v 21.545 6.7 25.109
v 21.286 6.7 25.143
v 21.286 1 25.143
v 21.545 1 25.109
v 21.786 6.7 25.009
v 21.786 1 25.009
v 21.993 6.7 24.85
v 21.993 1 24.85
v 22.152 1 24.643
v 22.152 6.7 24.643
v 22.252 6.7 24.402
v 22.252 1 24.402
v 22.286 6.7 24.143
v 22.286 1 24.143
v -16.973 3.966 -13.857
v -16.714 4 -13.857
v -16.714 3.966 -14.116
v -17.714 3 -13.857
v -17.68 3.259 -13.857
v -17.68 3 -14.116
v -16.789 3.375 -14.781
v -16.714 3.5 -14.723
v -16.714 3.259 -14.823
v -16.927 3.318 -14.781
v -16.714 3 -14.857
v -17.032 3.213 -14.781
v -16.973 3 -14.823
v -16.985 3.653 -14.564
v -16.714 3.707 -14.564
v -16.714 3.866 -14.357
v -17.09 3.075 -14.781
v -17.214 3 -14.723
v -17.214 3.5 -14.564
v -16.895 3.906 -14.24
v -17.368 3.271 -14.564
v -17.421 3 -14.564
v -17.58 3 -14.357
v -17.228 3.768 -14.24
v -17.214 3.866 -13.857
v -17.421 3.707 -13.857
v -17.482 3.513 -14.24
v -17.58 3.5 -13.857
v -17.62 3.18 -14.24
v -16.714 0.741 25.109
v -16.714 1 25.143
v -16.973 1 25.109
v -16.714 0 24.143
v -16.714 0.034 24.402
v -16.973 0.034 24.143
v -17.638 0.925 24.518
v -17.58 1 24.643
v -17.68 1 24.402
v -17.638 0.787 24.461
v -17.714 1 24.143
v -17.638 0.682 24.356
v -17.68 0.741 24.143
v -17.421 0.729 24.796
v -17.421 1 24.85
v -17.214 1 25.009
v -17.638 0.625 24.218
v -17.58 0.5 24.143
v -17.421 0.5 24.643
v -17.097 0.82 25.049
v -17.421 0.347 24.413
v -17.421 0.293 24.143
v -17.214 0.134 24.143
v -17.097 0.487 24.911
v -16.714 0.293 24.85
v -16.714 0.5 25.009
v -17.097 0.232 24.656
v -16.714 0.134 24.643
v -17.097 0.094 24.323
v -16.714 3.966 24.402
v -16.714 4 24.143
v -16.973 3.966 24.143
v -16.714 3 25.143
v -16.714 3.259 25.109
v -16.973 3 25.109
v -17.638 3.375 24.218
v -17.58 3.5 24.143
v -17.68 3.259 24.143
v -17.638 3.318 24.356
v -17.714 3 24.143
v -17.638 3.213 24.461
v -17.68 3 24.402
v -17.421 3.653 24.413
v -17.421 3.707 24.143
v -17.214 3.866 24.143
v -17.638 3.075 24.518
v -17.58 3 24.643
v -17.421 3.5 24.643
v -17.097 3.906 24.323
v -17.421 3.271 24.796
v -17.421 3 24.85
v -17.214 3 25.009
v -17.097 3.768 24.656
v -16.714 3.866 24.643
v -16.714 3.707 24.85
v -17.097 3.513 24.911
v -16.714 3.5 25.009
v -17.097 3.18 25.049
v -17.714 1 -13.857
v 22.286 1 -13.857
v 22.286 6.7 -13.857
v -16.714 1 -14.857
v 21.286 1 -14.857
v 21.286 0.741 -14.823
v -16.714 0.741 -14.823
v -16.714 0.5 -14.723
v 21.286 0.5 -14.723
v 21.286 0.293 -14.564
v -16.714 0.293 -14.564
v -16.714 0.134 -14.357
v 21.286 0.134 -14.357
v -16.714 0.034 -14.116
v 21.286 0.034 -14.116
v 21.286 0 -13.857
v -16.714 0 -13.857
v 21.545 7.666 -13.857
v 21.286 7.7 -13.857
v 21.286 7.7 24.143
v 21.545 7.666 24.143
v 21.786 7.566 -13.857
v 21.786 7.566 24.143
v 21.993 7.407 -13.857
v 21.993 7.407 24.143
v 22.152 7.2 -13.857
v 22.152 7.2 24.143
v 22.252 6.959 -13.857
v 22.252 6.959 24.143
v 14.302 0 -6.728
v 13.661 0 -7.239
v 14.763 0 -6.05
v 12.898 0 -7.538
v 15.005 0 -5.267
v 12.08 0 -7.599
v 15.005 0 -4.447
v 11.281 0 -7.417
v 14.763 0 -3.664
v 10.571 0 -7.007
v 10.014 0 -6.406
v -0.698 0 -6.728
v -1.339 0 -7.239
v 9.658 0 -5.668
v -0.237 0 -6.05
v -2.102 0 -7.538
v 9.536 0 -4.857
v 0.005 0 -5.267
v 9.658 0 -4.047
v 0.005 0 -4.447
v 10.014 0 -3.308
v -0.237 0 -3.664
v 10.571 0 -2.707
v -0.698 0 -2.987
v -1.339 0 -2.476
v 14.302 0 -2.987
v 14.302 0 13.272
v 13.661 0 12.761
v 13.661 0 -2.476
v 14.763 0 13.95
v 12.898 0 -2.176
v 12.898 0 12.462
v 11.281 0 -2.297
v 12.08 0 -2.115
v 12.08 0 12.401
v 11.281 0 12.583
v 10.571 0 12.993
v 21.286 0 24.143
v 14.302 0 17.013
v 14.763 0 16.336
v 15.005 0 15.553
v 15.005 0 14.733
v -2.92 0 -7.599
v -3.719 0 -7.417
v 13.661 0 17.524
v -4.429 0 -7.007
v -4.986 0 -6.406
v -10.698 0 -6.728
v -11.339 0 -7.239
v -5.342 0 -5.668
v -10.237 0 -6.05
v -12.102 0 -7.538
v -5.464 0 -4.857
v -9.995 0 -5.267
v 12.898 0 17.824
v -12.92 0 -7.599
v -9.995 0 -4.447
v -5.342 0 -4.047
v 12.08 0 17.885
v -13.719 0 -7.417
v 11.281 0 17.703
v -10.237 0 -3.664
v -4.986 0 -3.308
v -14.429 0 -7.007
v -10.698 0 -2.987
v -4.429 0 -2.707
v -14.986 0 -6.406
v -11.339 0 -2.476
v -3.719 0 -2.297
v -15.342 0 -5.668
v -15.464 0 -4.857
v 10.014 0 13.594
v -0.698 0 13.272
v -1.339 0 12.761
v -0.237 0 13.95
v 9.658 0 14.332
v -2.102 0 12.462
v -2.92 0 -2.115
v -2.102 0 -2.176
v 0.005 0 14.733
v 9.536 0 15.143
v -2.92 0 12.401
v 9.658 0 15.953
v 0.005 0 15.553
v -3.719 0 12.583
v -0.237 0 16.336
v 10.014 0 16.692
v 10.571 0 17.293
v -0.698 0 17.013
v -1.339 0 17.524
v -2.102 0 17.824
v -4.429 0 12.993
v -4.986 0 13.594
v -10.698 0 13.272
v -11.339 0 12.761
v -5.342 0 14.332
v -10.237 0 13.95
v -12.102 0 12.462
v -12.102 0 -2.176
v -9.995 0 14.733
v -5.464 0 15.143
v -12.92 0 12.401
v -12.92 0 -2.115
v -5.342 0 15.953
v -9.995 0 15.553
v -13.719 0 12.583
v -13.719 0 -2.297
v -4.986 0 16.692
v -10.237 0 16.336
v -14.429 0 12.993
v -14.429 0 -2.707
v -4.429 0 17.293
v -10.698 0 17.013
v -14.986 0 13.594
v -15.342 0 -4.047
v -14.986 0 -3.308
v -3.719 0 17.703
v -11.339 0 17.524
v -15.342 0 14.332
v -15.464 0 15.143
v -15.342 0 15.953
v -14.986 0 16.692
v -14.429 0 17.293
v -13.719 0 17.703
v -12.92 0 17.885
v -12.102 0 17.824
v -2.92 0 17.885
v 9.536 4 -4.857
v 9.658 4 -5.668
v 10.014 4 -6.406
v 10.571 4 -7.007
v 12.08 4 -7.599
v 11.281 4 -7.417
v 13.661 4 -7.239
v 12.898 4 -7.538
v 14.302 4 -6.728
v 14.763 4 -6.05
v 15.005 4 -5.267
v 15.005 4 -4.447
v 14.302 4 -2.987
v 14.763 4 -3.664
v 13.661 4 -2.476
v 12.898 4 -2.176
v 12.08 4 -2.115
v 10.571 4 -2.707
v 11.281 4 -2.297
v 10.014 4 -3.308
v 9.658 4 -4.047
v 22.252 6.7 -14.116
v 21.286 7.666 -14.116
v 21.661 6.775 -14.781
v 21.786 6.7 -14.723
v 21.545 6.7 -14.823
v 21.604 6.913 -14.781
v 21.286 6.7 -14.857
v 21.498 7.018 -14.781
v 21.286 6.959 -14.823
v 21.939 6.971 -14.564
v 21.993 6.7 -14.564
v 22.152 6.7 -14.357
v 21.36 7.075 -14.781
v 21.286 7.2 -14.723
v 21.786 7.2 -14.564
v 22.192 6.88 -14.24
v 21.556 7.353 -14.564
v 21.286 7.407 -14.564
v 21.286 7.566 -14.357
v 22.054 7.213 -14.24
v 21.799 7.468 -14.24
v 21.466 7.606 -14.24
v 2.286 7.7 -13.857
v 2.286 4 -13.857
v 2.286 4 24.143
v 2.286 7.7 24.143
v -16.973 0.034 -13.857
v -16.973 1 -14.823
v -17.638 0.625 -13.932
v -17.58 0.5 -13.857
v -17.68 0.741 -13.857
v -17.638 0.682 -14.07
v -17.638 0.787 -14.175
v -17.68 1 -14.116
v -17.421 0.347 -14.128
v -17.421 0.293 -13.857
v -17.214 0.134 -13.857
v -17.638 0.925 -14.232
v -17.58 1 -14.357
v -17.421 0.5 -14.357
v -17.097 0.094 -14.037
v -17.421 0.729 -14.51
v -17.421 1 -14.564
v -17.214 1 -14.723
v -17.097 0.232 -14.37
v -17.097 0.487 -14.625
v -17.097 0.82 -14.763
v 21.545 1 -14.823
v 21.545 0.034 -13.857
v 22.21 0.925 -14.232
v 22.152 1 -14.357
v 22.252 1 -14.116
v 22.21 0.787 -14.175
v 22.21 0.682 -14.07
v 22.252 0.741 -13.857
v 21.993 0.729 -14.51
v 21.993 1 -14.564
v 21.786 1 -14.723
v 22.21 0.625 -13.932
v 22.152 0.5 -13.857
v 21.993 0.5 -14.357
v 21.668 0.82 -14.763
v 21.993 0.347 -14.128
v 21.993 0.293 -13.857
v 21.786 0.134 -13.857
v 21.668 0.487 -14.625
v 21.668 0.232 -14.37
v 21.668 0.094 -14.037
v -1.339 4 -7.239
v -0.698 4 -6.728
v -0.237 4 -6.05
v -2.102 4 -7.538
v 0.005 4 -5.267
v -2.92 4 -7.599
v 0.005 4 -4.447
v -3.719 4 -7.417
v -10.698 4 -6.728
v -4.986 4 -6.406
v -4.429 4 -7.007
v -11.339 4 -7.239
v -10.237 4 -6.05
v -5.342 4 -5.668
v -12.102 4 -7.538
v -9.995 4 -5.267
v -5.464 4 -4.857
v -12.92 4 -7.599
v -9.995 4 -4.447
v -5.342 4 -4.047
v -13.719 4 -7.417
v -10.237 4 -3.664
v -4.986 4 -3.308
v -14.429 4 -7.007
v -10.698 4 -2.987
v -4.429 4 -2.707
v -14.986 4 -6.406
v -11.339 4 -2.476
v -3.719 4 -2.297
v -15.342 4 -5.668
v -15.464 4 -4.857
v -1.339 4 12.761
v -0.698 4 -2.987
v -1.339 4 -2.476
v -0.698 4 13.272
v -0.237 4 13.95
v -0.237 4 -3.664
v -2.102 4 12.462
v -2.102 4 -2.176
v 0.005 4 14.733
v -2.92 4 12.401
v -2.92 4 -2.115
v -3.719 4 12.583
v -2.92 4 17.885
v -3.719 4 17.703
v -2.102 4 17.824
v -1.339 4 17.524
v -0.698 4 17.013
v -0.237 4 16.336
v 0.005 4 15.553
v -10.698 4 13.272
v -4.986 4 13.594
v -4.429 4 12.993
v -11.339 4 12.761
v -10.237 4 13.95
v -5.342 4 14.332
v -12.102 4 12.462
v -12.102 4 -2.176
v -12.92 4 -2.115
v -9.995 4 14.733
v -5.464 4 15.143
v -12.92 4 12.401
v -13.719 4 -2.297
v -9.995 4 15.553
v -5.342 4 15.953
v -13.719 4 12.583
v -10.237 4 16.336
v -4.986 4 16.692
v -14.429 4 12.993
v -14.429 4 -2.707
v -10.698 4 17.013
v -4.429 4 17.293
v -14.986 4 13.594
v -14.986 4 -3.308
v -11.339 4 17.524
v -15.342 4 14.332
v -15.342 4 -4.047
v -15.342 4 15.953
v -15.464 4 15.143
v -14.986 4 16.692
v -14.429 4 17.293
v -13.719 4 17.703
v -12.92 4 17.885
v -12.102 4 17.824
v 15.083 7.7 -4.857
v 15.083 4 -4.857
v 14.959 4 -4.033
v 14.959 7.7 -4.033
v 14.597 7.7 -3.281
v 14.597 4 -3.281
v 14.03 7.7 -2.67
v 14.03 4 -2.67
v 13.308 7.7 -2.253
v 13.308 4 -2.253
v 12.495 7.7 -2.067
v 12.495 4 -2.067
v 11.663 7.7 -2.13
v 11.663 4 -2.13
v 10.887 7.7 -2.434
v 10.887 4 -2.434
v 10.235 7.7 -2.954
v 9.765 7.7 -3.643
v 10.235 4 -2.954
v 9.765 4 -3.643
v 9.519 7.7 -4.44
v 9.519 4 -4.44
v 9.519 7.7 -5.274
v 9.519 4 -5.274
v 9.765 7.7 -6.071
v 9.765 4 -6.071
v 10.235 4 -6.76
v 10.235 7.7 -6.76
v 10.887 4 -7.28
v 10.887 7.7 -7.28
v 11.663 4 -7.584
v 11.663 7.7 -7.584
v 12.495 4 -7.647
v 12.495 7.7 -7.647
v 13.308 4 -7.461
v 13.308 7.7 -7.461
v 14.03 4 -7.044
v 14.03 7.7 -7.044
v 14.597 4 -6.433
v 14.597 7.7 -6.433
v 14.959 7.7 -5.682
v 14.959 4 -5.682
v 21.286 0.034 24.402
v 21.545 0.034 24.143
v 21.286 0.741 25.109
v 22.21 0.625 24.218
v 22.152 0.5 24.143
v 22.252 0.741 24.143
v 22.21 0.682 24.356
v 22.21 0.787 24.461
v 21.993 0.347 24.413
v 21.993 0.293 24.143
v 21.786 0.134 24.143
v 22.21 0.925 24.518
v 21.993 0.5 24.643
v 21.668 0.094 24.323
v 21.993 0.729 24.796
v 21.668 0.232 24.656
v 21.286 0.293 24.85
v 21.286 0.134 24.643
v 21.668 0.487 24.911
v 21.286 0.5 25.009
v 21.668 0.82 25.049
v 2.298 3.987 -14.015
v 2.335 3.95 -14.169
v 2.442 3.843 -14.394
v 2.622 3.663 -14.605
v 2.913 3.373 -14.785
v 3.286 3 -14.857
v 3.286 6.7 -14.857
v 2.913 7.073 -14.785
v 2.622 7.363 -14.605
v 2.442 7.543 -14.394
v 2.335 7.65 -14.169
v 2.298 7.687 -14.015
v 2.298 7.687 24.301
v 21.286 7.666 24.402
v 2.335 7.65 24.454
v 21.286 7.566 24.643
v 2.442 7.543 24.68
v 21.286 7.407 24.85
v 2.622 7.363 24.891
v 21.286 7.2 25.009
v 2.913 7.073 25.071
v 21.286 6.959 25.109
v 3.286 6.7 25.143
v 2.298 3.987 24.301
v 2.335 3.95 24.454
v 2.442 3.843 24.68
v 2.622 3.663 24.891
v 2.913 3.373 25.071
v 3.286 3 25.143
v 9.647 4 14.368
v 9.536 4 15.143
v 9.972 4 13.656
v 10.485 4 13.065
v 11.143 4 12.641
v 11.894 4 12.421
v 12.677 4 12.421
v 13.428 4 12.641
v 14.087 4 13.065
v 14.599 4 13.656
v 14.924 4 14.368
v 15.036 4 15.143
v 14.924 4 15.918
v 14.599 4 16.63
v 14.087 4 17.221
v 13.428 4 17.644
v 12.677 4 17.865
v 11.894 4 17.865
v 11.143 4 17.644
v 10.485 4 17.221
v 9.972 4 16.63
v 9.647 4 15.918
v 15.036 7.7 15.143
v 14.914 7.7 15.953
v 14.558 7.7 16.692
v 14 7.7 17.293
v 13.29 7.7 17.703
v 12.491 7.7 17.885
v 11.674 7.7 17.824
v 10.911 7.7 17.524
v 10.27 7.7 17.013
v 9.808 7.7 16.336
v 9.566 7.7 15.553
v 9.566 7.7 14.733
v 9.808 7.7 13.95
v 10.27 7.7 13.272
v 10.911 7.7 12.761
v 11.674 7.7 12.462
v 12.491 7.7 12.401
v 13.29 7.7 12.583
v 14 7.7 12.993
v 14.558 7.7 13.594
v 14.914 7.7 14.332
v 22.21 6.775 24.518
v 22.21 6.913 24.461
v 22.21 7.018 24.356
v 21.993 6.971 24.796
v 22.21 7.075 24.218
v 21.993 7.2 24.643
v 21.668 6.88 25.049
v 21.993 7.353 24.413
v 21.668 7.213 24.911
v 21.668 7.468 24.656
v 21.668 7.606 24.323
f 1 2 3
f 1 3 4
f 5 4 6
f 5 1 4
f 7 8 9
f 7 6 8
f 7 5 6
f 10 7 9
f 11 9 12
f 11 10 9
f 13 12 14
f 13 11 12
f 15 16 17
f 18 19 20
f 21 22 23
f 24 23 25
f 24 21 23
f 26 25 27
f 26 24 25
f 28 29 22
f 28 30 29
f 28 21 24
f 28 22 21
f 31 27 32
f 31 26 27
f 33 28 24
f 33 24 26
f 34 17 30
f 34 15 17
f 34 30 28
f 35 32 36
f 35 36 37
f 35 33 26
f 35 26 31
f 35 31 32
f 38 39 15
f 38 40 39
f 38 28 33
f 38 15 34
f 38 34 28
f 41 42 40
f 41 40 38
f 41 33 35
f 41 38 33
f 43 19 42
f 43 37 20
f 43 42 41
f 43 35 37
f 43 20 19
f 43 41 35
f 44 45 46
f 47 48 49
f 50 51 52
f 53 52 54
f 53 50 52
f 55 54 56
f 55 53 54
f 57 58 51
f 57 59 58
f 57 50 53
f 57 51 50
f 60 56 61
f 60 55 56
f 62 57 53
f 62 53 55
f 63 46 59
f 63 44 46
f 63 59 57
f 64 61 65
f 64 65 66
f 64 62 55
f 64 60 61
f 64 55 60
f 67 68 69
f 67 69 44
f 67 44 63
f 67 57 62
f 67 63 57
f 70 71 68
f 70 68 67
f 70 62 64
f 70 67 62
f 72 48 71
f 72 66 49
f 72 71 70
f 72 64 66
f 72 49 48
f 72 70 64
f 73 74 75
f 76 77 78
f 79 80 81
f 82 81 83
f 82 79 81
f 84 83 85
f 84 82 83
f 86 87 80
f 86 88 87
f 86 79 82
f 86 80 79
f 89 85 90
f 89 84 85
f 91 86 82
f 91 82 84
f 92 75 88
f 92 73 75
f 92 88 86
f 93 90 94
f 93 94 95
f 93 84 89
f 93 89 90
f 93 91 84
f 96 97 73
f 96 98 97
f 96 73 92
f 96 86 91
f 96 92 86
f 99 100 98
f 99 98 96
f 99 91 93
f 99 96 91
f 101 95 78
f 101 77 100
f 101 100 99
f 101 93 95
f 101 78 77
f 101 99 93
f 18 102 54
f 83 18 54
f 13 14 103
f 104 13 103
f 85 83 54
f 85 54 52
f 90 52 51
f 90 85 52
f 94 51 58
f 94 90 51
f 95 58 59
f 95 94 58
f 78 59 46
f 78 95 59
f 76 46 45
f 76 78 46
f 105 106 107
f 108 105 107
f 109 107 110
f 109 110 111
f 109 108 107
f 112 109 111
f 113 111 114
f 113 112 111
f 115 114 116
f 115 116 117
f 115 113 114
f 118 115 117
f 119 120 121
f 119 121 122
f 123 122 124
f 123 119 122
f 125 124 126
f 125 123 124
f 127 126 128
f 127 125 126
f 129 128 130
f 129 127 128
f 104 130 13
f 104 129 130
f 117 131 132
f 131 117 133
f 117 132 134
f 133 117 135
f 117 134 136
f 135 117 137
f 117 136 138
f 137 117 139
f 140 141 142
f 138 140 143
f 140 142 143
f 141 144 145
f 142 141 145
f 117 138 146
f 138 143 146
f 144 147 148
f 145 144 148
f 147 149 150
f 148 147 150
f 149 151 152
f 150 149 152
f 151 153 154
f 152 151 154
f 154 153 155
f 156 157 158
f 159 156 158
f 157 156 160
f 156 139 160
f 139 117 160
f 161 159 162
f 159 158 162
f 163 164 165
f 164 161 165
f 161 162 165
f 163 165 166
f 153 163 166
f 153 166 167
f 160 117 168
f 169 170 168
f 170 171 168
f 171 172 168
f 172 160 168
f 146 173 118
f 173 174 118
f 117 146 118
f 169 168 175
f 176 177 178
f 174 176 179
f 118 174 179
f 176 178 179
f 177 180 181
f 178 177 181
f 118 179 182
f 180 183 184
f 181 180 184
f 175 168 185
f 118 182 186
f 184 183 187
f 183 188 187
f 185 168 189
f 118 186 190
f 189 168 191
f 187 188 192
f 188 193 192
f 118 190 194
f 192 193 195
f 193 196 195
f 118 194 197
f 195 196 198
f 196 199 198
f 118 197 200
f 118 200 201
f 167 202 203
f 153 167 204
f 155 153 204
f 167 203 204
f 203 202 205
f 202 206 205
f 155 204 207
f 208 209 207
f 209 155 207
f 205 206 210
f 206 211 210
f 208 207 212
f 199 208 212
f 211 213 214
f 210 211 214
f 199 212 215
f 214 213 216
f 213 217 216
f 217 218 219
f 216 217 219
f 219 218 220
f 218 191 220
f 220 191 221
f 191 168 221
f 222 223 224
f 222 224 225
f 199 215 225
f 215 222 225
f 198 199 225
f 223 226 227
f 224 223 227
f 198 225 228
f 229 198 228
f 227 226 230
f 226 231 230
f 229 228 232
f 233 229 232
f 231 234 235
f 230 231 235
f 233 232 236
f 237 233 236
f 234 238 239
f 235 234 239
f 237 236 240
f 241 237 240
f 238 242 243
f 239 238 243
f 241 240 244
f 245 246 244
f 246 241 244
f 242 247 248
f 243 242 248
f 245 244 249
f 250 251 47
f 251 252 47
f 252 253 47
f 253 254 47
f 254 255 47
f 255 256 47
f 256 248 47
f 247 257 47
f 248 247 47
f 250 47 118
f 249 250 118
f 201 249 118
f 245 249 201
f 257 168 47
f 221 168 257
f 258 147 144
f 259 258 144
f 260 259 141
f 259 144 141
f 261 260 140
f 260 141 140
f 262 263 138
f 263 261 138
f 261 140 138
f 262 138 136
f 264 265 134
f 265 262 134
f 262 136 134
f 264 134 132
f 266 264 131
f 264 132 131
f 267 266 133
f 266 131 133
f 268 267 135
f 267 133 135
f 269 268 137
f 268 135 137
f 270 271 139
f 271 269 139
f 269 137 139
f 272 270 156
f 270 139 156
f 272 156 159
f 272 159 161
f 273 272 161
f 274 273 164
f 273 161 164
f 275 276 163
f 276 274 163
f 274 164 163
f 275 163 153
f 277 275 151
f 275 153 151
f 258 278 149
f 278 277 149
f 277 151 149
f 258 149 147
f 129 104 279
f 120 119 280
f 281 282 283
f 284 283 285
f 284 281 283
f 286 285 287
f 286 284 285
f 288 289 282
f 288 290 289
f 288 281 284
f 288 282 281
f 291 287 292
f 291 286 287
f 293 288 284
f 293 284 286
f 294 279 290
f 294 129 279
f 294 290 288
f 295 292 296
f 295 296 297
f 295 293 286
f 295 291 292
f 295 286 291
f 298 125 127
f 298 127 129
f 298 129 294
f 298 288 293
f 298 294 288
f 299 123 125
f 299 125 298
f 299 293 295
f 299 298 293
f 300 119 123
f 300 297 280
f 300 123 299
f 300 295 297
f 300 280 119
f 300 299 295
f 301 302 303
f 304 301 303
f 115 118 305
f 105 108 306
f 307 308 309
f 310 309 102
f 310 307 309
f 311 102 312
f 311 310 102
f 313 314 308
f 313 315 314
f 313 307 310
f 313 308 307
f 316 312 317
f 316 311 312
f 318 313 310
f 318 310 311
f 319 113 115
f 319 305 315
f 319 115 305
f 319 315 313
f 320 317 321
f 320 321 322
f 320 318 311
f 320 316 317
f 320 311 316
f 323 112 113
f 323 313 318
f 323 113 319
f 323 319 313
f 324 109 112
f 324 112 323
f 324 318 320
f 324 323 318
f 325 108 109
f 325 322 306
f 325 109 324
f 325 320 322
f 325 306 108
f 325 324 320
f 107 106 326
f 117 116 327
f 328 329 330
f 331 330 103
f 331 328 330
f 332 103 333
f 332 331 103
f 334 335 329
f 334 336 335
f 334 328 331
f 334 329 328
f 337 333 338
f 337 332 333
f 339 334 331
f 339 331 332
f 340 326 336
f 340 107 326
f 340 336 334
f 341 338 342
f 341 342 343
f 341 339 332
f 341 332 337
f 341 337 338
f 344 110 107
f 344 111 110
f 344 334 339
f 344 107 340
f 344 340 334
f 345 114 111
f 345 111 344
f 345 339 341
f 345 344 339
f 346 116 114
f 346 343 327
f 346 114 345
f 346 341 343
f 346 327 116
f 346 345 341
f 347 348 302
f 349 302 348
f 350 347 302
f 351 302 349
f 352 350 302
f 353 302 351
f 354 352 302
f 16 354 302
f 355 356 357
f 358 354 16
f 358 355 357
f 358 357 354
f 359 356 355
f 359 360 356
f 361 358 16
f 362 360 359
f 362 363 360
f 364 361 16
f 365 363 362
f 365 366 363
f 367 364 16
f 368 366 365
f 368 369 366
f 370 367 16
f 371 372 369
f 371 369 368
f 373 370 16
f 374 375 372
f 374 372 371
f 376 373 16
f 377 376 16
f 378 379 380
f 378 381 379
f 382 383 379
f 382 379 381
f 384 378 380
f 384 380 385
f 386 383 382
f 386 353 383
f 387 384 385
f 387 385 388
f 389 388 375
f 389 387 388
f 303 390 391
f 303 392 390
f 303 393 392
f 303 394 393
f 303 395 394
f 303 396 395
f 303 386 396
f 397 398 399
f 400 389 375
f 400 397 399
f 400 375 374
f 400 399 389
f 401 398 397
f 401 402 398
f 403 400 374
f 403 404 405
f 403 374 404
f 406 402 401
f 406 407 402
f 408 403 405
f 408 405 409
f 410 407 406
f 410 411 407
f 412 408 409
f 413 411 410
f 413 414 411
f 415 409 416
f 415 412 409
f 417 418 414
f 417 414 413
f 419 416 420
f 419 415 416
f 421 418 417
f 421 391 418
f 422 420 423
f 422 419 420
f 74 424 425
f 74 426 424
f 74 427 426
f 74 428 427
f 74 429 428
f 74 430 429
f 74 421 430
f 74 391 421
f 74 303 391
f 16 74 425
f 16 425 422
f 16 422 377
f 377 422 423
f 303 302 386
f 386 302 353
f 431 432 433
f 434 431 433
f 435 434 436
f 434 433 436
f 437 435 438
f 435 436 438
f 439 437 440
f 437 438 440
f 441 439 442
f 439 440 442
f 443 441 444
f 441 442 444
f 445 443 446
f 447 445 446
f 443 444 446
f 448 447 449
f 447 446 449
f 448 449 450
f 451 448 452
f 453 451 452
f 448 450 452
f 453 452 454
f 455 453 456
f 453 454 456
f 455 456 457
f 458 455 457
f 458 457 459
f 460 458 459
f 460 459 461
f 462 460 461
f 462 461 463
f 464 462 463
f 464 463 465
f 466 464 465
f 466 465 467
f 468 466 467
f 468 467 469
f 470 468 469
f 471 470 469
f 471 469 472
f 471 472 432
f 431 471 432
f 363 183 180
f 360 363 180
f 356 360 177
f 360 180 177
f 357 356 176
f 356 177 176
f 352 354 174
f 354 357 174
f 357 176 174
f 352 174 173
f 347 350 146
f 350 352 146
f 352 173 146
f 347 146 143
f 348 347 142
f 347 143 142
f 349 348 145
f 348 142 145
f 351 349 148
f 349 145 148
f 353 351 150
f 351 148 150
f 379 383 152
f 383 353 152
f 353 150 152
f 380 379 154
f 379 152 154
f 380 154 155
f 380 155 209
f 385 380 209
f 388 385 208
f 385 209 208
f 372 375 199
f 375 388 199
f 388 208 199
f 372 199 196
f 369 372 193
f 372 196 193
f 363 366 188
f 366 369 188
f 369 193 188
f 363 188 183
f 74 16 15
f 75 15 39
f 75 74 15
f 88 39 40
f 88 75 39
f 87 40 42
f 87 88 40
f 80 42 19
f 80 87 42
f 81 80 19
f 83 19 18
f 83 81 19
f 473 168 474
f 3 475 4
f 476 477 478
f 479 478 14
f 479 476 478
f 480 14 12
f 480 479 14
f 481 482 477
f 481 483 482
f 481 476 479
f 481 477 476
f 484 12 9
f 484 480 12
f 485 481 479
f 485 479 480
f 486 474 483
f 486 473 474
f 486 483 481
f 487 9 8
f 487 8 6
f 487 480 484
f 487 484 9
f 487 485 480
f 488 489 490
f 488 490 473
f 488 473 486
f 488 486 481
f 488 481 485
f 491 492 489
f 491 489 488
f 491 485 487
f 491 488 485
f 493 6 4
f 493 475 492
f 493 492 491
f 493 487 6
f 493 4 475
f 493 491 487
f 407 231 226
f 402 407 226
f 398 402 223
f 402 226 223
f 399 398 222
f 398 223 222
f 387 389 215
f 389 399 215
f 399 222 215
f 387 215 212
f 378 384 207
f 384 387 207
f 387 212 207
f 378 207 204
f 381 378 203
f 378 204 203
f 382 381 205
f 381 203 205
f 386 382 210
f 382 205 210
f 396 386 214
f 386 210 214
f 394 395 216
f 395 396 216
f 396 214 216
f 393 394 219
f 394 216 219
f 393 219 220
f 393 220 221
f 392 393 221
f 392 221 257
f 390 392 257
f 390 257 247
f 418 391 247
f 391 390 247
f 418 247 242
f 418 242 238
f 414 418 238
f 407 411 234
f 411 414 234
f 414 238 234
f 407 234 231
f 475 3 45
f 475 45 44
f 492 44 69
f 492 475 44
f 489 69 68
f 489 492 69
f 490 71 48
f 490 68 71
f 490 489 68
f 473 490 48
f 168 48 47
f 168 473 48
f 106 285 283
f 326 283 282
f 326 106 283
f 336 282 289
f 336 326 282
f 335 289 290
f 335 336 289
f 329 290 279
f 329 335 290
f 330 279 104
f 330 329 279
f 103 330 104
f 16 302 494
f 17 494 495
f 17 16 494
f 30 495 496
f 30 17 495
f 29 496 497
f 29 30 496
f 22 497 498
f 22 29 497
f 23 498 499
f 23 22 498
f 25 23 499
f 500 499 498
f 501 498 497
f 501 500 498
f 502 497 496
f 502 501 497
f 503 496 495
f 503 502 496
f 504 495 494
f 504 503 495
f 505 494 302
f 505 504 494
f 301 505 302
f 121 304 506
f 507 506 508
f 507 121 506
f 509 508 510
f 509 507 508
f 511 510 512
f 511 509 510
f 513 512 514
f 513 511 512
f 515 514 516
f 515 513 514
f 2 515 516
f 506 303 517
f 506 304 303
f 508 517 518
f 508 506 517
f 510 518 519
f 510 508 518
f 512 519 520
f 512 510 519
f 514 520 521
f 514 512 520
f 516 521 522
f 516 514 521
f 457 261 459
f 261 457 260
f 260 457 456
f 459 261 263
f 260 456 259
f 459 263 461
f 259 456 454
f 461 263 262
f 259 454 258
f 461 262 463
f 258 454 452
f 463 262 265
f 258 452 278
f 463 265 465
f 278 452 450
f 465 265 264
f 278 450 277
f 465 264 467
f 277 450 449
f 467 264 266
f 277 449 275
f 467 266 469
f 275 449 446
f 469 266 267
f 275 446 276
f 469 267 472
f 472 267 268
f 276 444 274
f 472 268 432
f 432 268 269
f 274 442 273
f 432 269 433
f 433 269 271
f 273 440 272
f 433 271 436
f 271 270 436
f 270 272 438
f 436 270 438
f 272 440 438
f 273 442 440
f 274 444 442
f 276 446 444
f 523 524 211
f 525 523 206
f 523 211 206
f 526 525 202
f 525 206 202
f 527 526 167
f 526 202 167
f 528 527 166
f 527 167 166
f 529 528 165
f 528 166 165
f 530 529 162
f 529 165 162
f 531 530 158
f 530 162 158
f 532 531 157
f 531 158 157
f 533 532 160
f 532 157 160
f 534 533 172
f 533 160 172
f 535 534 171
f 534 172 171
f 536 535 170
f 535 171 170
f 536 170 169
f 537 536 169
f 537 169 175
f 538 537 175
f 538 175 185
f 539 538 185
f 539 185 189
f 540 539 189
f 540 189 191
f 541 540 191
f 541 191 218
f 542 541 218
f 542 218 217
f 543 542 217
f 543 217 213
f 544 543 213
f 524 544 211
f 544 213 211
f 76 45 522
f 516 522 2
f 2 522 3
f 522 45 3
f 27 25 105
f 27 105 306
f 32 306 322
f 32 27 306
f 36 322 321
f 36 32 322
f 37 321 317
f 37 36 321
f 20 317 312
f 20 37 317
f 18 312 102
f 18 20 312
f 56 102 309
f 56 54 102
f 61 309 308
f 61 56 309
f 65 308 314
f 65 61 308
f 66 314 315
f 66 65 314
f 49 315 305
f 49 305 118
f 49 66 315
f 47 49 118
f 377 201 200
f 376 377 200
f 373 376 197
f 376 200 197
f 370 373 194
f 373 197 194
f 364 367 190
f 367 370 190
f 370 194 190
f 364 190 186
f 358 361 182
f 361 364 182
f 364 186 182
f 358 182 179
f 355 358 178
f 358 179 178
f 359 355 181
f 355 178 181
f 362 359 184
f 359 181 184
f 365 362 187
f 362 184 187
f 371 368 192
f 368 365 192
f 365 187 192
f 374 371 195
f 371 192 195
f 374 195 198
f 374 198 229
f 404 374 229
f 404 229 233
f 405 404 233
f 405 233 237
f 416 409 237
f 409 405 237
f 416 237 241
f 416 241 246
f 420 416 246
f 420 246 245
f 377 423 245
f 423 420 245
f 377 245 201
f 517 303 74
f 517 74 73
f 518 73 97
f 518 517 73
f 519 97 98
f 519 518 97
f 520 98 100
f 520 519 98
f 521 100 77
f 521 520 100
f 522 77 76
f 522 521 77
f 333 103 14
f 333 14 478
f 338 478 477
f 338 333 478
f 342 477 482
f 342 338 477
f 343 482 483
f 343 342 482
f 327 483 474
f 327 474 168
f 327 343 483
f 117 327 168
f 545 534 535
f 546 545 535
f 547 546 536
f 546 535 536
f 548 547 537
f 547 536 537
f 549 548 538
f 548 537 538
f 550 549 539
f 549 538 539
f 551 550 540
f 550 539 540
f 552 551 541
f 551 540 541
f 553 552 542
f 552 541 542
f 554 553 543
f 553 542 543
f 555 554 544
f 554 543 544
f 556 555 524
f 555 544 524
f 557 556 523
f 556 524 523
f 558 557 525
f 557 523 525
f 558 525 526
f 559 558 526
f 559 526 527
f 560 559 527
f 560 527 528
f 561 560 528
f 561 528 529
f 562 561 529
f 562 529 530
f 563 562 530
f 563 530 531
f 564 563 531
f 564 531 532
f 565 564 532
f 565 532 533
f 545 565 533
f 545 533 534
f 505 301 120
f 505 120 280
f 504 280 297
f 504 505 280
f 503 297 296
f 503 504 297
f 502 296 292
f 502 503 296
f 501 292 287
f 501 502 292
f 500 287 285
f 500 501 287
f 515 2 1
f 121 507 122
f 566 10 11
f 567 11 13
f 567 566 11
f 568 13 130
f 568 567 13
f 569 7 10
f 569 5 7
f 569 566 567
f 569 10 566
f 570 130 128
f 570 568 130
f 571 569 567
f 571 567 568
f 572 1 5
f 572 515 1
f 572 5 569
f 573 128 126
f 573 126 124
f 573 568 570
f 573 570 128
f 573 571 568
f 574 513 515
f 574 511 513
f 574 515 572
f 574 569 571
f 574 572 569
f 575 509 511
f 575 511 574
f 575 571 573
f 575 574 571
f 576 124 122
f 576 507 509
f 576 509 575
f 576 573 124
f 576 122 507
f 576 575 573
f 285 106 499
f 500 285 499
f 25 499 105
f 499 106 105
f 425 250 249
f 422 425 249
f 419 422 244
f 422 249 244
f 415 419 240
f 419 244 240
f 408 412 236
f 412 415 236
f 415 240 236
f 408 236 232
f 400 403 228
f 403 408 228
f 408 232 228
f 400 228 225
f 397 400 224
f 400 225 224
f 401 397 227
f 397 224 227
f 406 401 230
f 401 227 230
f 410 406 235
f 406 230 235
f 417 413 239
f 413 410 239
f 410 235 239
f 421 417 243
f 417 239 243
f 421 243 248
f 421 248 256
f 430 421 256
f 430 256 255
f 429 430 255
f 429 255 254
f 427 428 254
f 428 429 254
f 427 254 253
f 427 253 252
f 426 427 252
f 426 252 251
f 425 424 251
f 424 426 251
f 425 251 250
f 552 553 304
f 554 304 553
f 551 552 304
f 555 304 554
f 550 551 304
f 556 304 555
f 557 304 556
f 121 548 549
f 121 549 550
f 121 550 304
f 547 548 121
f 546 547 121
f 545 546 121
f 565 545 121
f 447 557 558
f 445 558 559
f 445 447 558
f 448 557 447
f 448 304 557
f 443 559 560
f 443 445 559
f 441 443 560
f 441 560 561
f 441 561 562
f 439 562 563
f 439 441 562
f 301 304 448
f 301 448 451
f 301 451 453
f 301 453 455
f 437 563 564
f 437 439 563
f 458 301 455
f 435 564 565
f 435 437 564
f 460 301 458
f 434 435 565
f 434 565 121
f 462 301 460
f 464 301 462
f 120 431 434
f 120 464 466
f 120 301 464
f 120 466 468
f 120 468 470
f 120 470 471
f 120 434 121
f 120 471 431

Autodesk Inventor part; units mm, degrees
ref_plane "YZ Plane" through (0, 0, 0) normal (1, 0, 0) x (0, 1, 0)
ref_plane "XZ Plane" through (0, 0, 0) normal (0, 1, 0) x (-1, 0, 0)
ref_plane "XY Plane" through (0, 0, 0) normal (0, 0, 1) x (1, 0, 0)
sketch "Sketch1" plane through (0, 0, 0) normal (0, 1, 0) x (-1, 0, 0)
  line L0 (17.7143, 25.1429) -> (-22.2857, 25.1429)
  line L1 (-22.2857, 25.1429) -> (-22.2857, -14.8571)
  line L2 (-22.2857, -14.8571) -> (17.7143, -14.8571)
  line L3 (17.7143, -14.8571) -> (17.7143, 25.1429)
  circle A0 centre (12.7143, 15.1429) radius 2.75
  circle A1 centre (12.7143, -4.8571) radius 2.75
  circle A2 centre (2.7143, -4.8571) radius 2.75
  circle A3 centre (2.7143, 15.1429) radius 2.75
  circle A4 centre (-12.2857, 15.1429) radius 2.75
  circle A5 centre (-12.2857, -4.8571) radius 2.75
  point P0 (0, 0)
  dimension "d1" = 40
  dimension "d2" = 5.5
  dimension "d3" = 5.5
  dimension "d4" = 5.5
  dimension "d5" = 5.5
  dimension "d6" = 5.5
  dimension "d7" = 5.5
  dimension "d9" = 10
  dimension "d12" = 20
  dimension "d13" = 10
  dimension "d17" = 5
  dimension "d28" = 10
  dimension "d32" = 15
extrude "Extrusion1" add sketch "Sketch1" along normal blind 4
sketch "Sketch2" plane through (0, 4, 0) normal (0, 1, 0) x (1, 0, 0)
  line L0 (22.2857, -25.1429) -> (22.2857, 14.8571) projected
  line L1 (22.2857, 14.8571) -> (2.2857, 14.8571)
  line L2 (2.2857, 14.8571) -> (2.2857, -25.1429)
  line L3 (2.2857, -25.1429) -> (22.2857, -25.1429)
  line L4 (22.2857, -25.1429) -> (22.2857, 14.8571)
  point P0 (0, 0)
  dimension "d30" = 20
  dimension "d31" = 40
extrude "Extrusion2" add sketch "Sketch2" along normal blind 3.7
sketch "Sketch3" plane through (12.2857, 4, -4.8571) normal (0, -1, 0) x (1, 0, 0)
  circle A0 centre (0, 0) radius 2.7975
  circle A1 centre (0, 20) radius 2.75
  line L0 (10, -10) -> (-30, -10) projected
  line L1 (10, 30) -> (10, -10) projected
  point P0 (-12.2857, 4.8571)
  dimension "d21" = 20
  dimension "d22" = 5.5
  dimension "d23" = 10
  dimension "d24" = 10
extrude "Extrusion3" cut sketch "Sketch3" against normal blind 3.7
fillet "Fillet2" radius 1 16 edges at (2.2857, 0, 25.1429) (-7.7143, 4, 25.1429) (12.2857, 7.7, 25.1429) (22.2857, 3.85, 25.1429) (22.2857, 7.7, 5.1429) (12.2857, 7.7, -14.8571) (-17.7143, 4, 5.1429) (-7.7143, 4, -14.8571) (2.2857, 0, -14.8571) (-17.7143, 2, -14.8571) (-17.7143, 0, 5.1429) (-17.7143, 2, 25.1429) (22.2857, 3.85, -14.8571) (22.2857, 0, 5.1429) (2.2857, 5.85, 25.1429) (2.2857, 5.85, -14.8571)
properties part number "syringepumpplate"
